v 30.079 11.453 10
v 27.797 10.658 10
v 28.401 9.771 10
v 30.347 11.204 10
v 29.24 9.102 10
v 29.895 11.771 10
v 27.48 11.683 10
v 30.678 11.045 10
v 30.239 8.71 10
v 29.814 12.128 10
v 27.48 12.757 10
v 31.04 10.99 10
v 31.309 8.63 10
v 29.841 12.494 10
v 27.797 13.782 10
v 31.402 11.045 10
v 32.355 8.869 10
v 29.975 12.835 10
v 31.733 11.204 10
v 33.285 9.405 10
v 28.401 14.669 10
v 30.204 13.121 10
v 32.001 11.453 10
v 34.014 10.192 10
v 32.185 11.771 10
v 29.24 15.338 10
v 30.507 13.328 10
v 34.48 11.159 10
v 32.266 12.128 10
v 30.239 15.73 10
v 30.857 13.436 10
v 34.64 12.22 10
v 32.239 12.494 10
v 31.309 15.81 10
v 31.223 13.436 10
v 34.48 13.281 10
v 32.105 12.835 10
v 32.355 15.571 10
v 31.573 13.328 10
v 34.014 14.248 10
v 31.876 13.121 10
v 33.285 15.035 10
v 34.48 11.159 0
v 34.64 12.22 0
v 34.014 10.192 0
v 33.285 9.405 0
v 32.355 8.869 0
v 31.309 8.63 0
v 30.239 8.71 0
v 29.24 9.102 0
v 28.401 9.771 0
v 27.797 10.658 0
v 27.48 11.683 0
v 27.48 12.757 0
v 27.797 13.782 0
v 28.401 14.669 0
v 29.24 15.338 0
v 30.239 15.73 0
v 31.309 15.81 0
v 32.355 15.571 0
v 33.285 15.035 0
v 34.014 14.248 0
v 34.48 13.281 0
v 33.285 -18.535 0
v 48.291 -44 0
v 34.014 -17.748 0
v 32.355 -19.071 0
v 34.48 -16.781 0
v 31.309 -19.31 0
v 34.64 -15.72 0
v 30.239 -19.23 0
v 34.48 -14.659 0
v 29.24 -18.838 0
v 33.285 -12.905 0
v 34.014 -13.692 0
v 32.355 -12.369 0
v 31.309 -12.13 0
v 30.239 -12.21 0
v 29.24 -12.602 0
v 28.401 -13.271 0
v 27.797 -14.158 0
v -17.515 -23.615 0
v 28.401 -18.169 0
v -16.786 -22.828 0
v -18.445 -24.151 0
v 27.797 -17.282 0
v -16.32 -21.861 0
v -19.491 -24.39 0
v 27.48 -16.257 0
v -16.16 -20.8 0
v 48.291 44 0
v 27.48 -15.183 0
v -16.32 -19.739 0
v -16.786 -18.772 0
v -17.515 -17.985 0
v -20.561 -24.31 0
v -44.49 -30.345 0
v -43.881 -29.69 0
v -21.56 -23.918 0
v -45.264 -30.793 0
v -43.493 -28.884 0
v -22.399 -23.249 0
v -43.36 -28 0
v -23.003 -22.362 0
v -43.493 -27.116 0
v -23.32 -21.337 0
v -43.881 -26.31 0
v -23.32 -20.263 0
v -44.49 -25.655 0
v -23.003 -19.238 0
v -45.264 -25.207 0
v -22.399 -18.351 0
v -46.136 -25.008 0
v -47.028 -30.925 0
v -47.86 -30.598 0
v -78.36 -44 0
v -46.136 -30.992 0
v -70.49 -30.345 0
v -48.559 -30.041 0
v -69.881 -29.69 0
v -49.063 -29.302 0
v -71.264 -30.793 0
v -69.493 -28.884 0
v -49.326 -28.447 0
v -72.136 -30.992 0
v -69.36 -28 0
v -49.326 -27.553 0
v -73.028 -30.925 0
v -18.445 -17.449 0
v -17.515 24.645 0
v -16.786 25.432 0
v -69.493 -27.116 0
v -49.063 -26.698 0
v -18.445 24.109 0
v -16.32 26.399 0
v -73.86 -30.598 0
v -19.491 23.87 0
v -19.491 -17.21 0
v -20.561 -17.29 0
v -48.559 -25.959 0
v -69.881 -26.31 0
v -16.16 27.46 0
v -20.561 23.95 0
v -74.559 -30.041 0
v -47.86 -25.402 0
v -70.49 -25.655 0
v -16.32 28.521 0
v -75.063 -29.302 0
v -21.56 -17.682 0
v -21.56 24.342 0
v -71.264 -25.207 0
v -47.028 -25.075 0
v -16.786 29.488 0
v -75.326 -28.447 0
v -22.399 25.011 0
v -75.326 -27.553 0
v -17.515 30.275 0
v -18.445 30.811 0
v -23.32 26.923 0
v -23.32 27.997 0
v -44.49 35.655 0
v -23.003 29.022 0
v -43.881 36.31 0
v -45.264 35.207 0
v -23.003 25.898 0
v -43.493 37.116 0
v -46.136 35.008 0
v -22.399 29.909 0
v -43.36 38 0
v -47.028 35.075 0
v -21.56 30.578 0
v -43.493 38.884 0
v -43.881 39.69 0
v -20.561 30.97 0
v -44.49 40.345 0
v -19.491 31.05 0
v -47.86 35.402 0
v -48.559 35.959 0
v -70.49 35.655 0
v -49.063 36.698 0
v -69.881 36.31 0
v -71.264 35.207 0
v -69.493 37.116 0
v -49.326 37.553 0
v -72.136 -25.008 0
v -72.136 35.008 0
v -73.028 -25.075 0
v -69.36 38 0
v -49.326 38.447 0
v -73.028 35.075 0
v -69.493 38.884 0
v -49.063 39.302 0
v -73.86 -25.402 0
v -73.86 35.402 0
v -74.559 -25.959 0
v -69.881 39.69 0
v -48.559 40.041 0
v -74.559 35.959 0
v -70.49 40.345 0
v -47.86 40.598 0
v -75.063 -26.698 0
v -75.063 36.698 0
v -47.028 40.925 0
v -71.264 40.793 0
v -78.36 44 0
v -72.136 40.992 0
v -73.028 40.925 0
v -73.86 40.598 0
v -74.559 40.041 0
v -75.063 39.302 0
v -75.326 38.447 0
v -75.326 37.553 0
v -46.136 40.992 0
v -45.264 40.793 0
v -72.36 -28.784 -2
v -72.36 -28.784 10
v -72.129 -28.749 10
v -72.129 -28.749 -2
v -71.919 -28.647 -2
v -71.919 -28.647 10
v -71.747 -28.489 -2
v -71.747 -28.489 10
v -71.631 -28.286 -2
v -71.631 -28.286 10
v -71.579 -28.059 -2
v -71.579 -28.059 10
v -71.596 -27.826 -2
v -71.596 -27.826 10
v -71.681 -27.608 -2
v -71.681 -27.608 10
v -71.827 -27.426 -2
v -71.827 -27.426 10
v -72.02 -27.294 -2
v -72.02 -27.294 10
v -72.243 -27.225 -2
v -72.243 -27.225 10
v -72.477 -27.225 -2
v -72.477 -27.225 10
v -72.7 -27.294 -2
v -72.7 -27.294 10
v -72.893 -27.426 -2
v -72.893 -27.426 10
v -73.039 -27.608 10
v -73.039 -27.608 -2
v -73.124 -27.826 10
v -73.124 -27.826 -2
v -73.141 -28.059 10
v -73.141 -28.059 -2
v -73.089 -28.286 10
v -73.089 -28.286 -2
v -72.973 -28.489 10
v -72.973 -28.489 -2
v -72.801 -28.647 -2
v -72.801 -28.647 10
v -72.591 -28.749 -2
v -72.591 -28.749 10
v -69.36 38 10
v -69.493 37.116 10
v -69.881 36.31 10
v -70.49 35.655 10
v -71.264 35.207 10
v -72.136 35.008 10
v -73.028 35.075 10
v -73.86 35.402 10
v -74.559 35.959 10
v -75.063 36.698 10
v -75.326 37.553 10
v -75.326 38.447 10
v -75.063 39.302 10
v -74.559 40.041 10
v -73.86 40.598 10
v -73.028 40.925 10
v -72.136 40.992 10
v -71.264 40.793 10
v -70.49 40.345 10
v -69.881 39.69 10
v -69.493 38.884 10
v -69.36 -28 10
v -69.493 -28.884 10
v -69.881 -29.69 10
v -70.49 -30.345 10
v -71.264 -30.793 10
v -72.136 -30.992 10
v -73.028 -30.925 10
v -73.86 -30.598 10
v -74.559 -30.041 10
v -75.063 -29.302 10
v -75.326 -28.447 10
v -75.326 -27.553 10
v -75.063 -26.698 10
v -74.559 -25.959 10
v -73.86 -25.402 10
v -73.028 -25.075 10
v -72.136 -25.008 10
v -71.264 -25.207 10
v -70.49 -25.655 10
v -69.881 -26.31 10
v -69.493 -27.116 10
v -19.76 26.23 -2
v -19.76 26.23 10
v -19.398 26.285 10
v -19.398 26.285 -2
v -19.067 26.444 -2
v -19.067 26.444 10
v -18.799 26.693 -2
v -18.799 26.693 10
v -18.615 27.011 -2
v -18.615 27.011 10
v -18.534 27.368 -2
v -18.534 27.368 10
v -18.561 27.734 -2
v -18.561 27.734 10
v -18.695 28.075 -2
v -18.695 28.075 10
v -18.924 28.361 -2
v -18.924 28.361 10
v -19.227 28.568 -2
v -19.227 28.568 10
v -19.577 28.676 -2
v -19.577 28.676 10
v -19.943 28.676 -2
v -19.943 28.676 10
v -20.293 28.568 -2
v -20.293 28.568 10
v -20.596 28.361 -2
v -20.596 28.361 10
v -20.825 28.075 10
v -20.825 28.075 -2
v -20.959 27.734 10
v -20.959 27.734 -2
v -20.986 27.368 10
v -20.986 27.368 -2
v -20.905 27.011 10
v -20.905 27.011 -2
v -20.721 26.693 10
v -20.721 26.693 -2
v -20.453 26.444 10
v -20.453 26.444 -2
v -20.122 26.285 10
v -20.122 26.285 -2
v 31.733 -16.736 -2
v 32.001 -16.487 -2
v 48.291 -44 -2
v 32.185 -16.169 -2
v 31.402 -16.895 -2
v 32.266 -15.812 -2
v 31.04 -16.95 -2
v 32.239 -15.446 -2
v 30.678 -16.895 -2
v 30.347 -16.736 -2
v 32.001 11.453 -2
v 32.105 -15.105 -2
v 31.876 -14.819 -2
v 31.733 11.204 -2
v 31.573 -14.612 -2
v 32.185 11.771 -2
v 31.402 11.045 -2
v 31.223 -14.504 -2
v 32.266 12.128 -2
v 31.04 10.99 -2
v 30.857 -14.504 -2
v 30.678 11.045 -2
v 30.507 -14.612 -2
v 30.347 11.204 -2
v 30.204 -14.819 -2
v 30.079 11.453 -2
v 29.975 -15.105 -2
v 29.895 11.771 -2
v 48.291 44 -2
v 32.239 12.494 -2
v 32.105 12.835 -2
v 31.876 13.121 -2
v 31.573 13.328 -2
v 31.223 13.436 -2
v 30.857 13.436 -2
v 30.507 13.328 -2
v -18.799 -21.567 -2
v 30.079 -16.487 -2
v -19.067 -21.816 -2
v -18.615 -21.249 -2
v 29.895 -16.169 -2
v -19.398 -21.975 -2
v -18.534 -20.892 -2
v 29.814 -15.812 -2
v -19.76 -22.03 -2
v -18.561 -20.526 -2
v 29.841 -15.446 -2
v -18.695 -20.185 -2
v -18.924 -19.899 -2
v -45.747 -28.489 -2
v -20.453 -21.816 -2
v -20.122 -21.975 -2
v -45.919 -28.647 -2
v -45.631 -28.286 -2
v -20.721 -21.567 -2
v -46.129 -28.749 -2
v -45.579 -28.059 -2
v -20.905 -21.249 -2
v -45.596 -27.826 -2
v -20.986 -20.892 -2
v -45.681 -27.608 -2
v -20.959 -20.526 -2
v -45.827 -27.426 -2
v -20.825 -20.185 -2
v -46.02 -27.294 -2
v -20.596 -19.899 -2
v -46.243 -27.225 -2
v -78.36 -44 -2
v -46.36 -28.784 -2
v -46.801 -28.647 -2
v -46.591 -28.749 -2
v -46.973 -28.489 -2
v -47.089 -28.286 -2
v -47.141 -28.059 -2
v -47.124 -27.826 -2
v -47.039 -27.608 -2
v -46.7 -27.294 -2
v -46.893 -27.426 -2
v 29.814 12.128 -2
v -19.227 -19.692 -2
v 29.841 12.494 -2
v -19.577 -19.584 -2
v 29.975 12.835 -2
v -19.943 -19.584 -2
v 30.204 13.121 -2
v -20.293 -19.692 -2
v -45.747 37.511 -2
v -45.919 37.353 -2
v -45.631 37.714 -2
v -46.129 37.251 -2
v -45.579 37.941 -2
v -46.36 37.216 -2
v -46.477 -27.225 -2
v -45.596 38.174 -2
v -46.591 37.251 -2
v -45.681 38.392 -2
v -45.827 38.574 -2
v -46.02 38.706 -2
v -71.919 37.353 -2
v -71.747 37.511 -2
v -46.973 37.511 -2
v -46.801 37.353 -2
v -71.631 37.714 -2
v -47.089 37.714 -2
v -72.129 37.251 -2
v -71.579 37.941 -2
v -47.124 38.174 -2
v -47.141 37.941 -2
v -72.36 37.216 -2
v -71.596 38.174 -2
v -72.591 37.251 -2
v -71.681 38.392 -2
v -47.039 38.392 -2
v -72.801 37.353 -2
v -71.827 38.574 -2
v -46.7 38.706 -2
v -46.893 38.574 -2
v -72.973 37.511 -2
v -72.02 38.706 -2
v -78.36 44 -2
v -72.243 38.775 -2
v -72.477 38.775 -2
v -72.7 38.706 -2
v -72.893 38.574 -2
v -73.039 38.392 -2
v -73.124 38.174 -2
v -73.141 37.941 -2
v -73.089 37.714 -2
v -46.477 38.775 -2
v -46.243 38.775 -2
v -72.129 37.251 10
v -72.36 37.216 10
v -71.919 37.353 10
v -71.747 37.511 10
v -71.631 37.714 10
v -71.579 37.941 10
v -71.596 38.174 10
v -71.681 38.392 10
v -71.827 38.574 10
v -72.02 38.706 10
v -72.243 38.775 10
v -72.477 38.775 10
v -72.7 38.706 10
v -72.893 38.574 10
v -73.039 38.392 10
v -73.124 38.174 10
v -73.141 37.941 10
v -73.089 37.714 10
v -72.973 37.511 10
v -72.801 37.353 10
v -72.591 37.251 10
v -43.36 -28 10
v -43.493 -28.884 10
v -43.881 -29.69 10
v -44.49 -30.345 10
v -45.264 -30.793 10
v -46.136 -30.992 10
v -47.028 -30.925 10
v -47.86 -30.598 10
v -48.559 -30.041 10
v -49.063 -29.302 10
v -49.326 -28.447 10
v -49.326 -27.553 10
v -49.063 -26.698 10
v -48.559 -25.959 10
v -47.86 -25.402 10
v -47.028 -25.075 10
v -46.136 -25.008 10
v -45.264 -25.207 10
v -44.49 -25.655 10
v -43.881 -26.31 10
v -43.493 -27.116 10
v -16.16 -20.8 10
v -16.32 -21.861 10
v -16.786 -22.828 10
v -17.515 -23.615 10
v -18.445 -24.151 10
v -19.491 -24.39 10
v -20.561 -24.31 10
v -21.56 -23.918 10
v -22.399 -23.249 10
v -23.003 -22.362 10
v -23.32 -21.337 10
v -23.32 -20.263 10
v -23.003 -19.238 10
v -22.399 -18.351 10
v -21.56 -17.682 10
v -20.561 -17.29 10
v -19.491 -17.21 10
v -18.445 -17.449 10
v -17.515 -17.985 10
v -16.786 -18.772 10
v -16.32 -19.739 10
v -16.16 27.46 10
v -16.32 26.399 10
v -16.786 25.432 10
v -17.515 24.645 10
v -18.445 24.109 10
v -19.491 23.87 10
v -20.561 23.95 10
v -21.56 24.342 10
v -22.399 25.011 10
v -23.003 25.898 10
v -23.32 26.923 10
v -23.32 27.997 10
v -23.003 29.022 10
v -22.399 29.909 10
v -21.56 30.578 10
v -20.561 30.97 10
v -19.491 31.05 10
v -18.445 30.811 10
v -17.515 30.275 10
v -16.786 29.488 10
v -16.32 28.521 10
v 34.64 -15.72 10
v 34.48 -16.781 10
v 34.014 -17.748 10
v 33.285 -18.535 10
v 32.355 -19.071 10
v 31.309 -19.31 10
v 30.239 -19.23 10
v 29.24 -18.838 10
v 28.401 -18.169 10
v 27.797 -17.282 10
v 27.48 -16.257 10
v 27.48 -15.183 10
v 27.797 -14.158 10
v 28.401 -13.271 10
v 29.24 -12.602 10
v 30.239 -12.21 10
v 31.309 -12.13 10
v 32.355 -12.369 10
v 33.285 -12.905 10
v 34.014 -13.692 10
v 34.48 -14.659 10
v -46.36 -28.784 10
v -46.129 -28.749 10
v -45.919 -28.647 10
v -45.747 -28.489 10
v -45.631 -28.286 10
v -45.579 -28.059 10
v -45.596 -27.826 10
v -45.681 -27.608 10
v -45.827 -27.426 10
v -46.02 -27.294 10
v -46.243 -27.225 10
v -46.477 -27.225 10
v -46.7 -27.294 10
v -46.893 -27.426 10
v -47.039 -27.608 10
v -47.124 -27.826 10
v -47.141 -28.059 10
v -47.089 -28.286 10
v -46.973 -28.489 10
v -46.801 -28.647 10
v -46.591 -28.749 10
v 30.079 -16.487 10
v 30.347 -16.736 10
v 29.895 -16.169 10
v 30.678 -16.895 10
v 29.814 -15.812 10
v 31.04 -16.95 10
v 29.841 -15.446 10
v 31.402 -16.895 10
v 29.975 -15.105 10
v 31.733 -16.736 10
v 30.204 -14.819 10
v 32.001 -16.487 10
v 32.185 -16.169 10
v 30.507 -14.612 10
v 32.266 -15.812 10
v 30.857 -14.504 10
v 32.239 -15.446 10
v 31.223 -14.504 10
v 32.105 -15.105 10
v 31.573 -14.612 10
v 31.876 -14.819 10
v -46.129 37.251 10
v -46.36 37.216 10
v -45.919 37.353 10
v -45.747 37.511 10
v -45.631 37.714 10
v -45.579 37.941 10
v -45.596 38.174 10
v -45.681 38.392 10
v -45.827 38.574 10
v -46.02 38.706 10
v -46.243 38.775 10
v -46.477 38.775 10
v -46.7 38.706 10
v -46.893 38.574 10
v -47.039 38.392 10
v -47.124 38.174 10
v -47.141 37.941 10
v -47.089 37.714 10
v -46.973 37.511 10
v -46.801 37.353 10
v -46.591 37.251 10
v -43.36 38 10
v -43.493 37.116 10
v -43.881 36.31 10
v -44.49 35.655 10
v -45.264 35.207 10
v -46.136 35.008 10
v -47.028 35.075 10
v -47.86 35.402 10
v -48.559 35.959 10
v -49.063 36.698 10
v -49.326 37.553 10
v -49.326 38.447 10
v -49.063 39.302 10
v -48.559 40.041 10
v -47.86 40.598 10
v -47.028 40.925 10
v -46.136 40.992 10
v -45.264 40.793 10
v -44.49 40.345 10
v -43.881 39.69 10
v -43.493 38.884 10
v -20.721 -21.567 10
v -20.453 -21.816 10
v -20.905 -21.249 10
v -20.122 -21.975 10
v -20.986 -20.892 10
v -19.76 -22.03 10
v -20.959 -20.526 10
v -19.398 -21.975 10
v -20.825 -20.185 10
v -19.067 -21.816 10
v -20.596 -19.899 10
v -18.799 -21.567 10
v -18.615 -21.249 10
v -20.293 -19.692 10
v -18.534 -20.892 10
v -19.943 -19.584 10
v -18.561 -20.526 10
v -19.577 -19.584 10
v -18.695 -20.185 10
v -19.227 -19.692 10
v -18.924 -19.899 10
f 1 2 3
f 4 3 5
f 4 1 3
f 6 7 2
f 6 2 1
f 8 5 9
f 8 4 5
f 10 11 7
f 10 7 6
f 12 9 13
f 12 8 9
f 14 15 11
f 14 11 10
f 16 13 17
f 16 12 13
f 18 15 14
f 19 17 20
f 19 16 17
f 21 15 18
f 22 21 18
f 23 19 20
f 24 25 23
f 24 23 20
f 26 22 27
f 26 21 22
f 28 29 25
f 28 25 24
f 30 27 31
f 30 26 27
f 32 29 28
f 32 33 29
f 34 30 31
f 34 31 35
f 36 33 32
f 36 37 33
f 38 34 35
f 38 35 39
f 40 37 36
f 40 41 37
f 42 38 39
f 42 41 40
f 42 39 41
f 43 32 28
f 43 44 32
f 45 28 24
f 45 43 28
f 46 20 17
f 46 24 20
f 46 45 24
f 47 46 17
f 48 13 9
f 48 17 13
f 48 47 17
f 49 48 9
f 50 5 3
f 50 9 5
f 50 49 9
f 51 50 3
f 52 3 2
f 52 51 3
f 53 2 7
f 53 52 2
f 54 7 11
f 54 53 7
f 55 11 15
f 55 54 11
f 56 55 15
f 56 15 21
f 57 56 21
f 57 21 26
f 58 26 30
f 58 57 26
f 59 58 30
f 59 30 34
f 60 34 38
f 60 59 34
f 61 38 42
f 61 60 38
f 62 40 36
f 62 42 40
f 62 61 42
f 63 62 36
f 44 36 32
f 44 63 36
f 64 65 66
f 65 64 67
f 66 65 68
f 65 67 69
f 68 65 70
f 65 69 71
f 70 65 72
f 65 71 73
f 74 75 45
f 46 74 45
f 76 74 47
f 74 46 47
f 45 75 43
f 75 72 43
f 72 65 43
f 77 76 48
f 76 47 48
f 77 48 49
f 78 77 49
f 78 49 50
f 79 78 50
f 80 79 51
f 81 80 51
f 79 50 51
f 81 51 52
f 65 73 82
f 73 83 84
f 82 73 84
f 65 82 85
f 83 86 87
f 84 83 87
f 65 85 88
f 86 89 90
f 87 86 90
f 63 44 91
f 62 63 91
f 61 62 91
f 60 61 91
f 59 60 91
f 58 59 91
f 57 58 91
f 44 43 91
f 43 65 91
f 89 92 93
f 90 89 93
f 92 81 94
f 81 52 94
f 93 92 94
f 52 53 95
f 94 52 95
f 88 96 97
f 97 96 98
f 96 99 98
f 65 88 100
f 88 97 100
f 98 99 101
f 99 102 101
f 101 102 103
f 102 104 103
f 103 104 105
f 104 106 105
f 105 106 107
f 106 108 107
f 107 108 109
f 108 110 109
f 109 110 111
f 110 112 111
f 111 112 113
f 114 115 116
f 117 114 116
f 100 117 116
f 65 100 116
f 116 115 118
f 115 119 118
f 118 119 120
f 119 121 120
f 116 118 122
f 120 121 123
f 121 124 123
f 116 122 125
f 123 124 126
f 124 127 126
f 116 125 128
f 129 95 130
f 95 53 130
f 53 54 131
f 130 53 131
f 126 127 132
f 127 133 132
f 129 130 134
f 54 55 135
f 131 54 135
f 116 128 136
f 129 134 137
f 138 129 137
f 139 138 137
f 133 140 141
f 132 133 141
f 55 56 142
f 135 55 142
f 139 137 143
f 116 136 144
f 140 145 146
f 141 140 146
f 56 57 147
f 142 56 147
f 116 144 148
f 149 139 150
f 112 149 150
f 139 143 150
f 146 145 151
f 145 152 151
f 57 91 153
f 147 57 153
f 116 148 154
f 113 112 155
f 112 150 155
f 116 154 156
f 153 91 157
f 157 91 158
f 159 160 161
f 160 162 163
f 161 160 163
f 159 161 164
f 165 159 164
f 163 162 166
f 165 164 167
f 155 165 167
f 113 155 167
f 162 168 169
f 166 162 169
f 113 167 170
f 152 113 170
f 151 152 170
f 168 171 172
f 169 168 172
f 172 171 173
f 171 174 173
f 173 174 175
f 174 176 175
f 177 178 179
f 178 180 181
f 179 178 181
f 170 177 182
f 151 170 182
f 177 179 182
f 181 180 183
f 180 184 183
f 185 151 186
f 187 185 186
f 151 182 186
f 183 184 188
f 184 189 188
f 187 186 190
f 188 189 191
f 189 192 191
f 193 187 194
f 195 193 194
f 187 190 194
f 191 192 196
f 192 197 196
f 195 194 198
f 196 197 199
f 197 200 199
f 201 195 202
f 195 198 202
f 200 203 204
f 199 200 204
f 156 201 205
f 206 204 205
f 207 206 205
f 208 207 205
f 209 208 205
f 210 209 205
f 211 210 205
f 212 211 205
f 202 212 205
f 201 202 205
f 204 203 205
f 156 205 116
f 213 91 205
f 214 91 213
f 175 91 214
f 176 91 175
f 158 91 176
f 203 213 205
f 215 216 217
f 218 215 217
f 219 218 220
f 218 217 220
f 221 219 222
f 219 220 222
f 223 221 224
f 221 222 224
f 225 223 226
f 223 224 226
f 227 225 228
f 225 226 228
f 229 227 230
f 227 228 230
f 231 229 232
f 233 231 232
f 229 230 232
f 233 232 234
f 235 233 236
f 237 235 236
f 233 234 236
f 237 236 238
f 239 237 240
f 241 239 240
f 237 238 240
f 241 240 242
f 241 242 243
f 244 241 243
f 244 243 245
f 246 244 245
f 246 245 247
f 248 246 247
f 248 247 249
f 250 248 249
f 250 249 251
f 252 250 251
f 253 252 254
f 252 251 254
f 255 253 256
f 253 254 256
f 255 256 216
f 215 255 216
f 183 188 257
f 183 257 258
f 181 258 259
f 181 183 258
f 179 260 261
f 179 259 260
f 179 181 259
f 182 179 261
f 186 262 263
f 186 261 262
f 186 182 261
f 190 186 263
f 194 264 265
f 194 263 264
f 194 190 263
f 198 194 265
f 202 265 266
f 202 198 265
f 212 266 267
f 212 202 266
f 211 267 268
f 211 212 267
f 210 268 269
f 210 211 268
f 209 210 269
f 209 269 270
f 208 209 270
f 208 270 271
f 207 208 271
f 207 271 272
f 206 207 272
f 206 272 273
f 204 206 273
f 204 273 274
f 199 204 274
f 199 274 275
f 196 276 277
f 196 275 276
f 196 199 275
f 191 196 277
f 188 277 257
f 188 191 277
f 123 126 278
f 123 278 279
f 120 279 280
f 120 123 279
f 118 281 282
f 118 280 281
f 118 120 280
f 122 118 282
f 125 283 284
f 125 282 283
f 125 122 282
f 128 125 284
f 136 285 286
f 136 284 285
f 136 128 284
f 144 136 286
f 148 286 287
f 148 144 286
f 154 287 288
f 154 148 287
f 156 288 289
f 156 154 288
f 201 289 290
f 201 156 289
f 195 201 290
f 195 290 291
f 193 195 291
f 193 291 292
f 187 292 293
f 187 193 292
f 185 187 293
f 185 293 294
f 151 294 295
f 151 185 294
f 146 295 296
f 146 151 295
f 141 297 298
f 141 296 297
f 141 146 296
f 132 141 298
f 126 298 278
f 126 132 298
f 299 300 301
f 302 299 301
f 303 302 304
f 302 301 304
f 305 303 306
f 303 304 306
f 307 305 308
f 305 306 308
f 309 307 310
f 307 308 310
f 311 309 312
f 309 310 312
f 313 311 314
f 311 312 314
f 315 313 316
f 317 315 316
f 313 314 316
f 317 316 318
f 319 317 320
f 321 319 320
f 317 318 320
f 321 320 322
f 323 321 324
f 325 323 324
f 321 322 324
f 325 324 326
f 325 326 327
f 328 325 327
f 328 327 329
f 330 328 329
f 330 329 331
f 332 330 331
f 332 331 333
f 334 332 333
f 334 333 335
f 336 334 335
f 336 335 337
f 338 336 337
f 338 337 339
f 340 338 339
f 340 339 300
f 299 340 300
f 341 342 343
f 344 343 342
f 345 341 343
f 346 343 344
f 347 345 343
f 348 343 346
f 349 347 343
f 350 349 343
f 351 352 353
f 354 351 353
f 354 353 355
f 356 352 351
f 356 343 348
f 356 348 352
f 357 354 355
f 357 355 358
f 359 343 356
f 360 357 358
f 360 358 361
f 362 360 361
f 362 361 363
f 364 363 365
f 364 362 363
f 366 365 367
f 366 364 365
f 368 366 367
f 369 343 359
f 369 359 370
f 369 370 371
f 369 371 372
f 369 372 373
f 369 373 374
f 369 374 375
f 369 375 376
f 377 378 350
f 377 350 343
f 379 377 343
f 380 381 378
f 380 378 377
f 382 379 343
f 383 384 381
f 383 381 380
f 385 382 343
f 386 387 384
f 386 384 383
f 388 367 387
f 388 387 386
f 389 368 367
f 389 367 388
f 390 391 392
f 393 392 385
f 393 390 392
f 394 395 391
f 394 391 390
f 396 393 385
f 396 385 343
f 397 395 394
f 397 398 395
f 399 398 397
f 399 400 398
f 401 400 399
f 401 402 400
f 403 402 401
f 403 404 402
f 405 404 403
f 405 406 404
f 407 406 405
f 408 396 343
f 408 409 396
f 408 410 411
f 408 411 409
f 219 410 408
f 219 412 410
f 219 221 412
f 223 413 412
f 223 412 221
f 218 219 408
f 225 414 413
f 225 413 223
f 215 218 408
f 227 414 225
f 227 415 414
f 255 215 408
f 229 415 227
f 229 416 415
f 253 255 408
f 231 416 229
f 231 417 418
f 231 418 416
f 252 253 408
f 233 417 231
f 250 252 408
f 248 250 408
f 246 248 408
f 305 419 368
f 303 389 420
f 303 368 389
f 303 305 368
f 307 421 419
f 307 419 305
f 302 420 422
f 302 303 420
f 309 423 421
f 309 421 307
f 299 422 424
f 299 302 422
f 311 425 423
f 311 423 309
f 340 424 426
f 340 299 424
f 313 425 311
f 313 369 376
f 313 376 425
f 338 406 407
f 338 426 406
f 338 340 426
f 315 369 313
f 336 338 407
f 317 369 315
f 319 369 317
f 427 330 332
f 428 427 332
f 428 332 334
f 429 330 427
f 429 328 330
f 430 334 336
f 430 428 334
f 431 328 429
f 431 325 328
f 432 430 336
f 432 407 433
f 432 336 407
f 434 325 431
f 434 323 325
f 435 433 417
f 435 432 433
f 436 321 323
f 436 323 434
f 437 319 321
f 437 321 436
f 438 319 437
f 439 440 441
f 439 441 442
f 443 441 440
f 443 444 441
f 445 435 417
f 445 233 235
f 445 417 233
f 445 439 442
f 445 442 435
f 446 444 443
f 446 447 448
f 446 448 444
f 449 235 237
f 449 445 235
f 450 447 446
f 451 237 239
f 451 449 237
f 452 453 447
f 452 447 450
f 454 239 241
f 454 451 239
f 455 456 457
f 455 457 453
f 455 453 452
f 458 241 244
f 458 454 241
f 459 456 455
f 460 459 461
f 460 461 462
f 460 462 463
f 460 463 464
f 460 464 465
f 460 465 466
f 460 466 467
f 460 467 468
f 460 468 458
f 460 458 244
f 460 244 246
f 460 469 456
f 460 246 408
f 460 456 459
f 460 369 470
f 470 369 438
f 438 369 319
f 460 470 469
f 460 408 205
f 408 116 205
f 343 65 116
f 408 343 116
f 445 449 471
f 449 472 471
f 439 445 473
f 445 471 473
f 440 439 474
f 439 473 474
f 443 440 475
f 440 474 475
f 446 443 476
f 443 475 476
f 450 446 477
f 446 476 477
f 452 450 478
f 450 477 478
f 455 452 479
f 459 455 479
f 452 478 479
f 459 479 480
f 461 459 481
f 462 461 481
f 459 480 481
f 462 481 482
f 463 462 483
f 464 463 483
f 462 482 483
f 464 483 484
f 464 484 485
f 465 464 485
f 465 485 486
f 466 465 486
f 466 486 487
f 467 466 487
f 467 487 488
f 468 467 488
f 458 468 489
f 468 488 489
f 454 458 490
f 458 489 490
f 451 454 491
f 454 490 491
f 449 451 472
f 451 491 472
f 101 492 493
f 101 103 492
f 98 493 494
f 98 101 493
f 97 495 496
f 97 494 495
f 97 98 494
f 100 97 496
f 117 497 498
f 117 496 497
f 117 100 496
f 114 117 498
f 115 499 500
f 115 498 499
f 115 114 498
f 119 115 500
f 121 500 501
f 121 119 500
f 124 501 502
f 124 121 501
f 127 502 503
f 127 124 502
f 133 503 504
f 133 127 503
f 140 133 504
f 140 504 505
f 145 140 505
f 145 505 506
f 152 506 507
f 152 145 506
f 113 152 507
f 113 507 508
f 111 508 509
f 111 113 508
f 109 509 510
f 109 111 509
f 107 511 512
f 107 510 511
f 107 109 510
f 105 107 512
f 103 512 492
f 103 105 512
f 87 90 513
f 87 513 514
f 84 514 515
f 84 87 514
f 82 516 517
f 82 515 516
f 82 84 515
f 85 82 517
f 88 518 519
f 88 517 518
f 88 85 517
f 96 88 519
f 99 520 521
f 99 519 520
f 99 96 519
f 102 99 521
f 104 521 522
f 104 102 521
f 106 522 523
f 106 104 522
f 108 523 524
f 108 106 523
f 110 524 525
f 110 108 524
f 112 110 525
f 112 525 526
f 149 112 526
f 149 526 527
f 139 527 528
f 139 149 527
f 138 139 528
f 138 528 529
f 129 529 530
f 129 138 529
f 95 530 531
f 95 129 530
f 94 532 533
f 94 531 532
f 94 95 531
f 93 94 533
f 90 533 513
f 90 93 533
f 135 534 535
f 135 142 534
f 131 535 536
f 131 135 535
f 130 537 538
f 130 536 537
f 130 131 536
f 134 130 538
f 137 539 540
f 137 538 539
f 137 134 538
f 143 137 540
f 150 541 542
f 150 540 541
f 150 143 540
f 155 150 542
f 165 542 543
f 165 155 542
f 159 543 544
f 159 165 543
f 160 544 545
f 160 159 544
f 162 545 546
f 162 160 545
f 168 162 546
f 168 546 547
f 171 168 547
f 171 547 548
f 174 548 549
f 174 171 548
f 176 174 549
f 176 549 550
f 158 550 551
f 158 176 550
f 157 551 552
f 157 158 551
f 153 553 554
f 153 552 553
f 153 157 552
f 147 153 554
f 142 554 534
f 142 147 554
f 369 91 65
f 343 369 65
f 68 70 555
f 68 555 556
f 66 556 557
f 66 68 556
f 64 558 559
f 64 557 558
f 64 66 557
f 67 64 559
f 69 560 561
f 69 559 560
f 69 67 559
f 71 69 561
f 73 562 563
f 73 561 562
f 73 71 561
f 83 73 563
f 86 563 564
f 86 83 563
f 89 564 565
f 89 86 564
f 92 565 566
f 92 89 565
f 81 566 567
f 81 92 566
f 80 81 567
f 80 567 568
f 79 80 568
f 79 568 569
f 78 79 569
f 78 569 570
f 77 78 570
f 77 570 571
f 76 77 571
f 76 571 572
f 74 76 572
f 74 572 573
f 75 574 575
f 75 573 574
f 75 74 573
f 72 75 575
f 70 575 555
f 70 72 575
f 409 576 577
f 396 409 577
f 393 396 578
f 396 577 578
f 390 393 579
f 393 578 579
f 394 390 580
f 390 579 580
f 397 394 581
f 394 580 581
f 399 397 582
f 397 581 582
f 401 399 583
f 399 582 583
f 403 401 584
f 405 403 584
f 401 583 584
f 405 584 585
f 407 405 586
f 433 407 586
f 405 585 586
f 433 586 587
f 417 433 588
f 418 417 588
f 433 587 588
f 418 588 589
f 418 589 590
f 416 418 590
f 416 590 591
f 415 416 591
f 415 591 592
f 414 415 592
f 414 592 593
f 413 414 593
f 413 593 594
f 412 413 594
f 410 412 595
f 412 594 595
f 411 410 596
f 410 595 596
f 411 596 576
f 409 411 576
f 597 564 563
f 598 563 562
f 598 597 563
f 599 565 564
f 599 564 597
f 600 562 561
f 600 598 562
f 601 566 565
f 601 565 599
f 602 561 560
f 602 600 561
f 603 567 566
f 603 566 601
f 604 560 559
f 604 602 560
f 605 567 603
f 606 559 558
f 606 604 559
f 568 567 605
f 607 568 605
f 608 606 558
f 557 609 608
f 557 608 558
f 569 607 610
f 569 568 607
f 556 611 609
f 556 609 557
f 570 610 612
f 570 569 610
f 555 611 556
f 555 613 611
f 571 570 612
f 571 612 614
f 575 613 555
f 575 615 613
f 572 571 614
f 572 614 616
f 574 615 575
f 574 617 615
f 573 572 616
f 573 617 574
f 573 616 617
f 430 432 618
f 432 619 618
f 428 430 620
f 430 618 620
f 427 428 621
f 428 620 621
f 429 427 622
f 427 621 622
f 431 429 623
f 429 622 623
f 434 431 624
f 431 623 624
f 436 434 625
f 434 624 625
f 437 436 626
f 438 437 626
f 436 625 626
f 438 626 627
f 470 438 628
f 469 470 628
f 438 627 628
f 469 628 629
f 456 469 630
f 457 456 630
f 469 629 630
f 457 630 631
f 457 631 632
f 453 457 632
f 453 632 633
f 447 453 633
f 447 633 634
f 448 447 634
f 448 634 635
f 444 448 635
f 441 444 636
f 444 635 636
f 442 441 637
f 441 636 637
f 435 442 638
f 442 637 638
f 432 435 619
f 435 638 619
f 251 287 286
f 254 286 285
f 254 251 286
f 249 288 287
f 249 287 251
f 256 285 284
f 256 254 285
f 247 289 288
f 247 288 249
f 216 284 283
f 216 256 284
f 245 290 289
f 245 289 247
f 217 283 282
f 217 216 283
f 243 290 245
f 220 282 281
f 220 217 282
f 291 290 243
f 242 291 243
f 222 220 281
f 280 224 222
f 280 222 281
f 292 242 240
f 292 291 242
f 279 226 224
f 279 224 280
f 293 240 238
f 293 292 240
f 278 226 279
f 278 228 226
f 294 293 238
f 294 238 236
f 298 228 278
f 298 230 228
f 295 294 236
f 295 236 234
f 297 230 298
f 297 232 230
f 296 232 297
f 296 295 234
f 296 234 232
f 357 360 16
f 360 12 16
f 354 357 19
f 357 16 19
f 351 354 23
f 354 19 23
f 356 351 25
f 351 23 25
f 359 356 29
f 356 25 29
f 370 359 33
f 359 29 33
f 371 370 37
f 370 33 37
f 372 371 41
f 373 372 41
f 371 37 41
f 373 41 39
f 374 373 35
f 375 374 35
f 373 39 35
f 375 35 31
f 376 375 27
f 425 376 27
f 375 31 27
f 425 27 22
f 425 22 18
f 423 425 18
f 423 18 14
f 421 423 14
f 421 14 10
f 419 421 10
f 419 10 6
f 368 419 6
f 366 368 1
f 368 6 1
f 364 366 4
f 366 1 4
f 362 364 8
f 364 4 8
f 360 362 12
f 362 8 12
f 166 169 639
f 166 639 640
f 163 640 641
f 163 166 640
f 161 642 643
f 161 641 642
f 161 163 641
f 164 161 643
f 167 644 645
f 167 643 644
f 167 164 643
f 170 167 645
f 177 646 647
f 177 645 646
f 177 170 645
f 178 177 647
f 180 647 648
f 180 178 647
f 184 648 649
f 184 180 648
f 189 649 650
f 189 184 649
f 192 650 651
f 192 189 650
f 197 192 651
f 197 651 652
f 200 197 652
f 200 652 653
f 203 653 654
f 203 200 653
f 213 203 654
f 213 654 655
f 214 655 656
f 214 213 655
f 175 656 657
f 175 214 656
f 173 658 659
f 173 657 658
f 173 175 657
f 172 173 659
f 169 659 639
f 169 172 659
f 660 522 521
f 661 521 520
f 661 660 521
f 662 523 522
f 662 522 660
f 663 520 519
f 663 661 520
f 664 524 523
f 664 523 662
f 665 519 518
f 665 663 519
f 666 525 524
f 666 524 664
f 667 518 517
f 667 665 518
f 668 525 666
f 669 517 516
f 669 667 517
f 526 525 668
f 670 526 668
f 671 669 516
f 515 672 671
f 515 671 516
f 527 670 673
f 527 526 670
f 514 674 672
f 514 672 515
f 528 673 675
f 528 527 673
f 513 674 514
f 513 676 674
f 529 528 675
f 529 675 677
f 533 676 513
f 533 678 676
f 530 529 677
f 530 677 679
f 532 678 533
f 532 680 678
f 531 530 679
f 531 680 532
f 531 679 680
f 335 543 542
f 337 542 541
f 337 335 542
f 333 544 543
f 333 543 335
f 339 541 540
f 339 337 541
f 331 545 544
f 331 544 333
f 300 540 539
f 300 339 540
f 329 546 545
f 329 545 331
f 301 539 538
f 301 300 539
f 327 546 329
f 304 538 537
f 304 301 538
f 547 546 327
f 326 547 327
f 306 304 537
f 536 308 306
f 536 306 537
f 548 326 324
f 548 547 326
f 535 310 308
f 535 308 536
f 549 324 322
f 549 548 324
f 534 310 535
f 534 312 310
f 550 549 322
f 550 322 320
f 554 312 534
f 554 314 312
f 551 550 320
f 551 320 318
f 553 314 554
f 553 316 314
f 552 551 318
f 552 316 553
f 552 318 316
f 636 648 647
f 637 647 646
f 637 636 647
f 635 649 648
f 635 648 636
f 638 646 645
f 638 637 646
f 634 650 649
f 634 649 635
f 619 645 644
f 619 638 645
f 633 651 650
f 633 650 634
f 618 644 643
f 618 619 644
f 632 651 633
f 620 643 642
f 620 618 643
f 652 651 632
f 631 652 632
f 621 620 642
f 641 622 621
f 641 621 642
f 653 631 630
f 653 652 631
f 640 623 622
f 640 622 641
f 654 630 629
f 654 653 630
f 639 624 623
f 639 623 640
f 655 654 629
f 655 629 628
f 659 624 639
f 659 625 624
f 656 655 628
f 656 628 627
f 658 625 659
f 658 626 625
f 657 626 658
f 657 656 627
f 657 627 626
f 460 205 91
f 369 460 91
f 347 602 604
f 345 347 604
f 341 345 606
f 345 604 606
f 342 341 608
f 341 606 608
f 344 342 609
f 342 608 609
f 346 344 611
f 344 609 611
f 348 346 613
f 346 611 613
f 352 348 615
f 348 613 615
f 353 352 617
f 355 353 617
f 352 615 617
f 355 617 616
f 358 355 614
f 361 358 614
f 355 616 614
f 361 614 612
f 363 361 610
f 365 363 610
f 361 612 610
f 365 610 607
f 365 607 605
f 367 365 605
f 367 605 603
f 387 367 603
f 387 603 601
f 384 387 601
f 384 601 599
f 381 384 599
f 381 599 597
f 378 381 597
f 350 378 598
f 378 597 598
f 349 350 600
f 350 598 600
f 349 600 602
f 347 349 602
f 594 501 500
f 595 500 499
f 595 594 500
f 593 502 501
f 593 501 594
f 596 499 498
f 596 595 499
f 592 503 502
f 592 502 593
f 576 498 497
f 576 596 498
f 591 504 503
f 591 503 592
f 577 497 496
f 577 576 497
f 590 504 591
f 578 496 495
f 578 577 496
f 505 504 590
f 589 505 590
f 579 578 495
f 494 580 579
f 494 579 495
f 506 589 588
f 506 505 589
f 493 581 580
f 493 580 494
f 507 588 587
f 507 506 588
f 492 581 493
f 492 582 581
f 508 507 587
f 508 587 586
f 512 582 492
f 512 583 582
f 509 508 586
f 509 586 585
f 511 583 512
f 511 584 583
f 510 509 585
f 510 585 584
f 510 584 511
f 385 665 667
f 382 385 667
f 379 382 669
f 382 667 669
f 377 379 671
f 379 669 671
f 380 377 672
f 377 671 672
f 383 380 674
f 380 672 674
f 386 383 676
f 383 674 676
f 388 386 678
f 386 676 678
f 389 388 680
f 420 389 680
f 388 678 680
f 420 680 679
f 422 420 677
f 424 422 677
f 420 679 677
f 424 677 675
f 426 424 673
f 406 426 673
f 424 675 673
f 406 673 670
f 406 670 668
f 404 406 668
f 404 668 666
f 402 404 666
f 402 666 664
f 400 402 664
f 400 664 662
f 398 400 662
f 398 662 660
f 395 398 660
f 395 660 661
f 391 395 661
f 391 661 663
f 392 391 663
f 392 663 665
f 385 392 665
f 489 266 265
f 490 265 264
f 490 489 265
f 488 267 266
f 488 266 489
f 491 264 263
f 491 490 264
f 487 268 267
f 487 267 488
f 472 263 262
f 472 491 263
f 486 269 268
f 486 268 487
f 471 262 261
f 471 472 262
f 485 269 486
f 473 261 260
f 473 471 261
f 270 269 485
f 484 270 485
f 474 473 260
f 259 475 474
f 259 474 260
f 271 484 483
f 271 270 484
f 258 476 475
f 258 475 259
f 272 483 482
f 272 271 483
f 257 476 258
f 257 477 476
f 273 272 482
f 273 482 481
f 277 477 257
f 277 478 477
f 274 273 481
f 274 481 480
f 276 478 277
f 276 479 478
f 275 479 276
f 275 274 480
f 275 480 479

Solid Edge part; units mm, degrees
sketch "Sketch1" plane through (0, 0, 0) normal (0, 0, 1) x (1, 0, 0)
  line L0 (48.2908, -44) -> (-78.36, -44)
  line L1 (-78.36, -44) -> (-78.36, 44)
  line L2 (-78.36, 44) -> (48.2908, 44)
  line L3 (48.2908, 44) -> (48.2908, -44)
extrude "Protrusion1" add sketch "Sketch1" against normal blind 2
sketch "Sketch2" plane through (0, 0, 0) normal (0, 0, 1) x (1, 0, 0)
  circle A0 centre (-72.36, 38) radius 3
  circle A1 centre (-46.36, 38) radius 3
  circle A2 centre (-46.36, -28) radius 3
  circle A3 centre (-19.76, -20.8) radius 3.6
  circle A4 centre (-19.76, 27.46) radius 3.6
  circle A5 centre (31.04, -15.72) radius 3.6
  circle A6 centre (31.04, 12.22) radius 3.6
  circle A7 centre (-72.36, -28) radius 3
  dimension "D1" = 17.2508
  dimension "D2" = 23.2
  dimension "D3" = 2
  dimension "D4" = 3
  dimension "D5" = 66
  dimension "D6" = 3
  dimension "D7" = 23
  dimension "D8" = 16
  dimension "D9" = 2
  dimension "D10" = 3
  dimension "D11" = 26
extrude "ExtrudedProtrusion_3" add sketch "Sketch2" along normal blind 10
hole "Hole_1" at (-46.36, -28, 10) direction (0, 0, -1) diameter 1.567 end up to next
hole "Hole1" at (-72.36, -28, 10) direction (0, 0, -1) diameter 1.567 end up to next
hole "Hole2" at (-72.36, 38, 10) direction (0, 0, -1) diameter 1.567 end up to next
hole "Hole3" at (-46.36, 38, 10) direction (0, 0, -1) diameter 1.567 end up to next
hole "Hole_5" at (31.04, 12.22, 10) direction (0, 0, -1) diameter 2.459 end up to next
hole "Hole4" at (31.04, -15.72, 10) direction (0, 0, -1) diameter 2.459 end up to next
hole "Hole5" at (-19.76, -20.8, 10) direction (0, 0, -1) diameter 2.459 end up to next
hole "Hole6" at (-19.76, 27.46, 10) direction (0, 0, -1) diameter 2.459 end up to next
